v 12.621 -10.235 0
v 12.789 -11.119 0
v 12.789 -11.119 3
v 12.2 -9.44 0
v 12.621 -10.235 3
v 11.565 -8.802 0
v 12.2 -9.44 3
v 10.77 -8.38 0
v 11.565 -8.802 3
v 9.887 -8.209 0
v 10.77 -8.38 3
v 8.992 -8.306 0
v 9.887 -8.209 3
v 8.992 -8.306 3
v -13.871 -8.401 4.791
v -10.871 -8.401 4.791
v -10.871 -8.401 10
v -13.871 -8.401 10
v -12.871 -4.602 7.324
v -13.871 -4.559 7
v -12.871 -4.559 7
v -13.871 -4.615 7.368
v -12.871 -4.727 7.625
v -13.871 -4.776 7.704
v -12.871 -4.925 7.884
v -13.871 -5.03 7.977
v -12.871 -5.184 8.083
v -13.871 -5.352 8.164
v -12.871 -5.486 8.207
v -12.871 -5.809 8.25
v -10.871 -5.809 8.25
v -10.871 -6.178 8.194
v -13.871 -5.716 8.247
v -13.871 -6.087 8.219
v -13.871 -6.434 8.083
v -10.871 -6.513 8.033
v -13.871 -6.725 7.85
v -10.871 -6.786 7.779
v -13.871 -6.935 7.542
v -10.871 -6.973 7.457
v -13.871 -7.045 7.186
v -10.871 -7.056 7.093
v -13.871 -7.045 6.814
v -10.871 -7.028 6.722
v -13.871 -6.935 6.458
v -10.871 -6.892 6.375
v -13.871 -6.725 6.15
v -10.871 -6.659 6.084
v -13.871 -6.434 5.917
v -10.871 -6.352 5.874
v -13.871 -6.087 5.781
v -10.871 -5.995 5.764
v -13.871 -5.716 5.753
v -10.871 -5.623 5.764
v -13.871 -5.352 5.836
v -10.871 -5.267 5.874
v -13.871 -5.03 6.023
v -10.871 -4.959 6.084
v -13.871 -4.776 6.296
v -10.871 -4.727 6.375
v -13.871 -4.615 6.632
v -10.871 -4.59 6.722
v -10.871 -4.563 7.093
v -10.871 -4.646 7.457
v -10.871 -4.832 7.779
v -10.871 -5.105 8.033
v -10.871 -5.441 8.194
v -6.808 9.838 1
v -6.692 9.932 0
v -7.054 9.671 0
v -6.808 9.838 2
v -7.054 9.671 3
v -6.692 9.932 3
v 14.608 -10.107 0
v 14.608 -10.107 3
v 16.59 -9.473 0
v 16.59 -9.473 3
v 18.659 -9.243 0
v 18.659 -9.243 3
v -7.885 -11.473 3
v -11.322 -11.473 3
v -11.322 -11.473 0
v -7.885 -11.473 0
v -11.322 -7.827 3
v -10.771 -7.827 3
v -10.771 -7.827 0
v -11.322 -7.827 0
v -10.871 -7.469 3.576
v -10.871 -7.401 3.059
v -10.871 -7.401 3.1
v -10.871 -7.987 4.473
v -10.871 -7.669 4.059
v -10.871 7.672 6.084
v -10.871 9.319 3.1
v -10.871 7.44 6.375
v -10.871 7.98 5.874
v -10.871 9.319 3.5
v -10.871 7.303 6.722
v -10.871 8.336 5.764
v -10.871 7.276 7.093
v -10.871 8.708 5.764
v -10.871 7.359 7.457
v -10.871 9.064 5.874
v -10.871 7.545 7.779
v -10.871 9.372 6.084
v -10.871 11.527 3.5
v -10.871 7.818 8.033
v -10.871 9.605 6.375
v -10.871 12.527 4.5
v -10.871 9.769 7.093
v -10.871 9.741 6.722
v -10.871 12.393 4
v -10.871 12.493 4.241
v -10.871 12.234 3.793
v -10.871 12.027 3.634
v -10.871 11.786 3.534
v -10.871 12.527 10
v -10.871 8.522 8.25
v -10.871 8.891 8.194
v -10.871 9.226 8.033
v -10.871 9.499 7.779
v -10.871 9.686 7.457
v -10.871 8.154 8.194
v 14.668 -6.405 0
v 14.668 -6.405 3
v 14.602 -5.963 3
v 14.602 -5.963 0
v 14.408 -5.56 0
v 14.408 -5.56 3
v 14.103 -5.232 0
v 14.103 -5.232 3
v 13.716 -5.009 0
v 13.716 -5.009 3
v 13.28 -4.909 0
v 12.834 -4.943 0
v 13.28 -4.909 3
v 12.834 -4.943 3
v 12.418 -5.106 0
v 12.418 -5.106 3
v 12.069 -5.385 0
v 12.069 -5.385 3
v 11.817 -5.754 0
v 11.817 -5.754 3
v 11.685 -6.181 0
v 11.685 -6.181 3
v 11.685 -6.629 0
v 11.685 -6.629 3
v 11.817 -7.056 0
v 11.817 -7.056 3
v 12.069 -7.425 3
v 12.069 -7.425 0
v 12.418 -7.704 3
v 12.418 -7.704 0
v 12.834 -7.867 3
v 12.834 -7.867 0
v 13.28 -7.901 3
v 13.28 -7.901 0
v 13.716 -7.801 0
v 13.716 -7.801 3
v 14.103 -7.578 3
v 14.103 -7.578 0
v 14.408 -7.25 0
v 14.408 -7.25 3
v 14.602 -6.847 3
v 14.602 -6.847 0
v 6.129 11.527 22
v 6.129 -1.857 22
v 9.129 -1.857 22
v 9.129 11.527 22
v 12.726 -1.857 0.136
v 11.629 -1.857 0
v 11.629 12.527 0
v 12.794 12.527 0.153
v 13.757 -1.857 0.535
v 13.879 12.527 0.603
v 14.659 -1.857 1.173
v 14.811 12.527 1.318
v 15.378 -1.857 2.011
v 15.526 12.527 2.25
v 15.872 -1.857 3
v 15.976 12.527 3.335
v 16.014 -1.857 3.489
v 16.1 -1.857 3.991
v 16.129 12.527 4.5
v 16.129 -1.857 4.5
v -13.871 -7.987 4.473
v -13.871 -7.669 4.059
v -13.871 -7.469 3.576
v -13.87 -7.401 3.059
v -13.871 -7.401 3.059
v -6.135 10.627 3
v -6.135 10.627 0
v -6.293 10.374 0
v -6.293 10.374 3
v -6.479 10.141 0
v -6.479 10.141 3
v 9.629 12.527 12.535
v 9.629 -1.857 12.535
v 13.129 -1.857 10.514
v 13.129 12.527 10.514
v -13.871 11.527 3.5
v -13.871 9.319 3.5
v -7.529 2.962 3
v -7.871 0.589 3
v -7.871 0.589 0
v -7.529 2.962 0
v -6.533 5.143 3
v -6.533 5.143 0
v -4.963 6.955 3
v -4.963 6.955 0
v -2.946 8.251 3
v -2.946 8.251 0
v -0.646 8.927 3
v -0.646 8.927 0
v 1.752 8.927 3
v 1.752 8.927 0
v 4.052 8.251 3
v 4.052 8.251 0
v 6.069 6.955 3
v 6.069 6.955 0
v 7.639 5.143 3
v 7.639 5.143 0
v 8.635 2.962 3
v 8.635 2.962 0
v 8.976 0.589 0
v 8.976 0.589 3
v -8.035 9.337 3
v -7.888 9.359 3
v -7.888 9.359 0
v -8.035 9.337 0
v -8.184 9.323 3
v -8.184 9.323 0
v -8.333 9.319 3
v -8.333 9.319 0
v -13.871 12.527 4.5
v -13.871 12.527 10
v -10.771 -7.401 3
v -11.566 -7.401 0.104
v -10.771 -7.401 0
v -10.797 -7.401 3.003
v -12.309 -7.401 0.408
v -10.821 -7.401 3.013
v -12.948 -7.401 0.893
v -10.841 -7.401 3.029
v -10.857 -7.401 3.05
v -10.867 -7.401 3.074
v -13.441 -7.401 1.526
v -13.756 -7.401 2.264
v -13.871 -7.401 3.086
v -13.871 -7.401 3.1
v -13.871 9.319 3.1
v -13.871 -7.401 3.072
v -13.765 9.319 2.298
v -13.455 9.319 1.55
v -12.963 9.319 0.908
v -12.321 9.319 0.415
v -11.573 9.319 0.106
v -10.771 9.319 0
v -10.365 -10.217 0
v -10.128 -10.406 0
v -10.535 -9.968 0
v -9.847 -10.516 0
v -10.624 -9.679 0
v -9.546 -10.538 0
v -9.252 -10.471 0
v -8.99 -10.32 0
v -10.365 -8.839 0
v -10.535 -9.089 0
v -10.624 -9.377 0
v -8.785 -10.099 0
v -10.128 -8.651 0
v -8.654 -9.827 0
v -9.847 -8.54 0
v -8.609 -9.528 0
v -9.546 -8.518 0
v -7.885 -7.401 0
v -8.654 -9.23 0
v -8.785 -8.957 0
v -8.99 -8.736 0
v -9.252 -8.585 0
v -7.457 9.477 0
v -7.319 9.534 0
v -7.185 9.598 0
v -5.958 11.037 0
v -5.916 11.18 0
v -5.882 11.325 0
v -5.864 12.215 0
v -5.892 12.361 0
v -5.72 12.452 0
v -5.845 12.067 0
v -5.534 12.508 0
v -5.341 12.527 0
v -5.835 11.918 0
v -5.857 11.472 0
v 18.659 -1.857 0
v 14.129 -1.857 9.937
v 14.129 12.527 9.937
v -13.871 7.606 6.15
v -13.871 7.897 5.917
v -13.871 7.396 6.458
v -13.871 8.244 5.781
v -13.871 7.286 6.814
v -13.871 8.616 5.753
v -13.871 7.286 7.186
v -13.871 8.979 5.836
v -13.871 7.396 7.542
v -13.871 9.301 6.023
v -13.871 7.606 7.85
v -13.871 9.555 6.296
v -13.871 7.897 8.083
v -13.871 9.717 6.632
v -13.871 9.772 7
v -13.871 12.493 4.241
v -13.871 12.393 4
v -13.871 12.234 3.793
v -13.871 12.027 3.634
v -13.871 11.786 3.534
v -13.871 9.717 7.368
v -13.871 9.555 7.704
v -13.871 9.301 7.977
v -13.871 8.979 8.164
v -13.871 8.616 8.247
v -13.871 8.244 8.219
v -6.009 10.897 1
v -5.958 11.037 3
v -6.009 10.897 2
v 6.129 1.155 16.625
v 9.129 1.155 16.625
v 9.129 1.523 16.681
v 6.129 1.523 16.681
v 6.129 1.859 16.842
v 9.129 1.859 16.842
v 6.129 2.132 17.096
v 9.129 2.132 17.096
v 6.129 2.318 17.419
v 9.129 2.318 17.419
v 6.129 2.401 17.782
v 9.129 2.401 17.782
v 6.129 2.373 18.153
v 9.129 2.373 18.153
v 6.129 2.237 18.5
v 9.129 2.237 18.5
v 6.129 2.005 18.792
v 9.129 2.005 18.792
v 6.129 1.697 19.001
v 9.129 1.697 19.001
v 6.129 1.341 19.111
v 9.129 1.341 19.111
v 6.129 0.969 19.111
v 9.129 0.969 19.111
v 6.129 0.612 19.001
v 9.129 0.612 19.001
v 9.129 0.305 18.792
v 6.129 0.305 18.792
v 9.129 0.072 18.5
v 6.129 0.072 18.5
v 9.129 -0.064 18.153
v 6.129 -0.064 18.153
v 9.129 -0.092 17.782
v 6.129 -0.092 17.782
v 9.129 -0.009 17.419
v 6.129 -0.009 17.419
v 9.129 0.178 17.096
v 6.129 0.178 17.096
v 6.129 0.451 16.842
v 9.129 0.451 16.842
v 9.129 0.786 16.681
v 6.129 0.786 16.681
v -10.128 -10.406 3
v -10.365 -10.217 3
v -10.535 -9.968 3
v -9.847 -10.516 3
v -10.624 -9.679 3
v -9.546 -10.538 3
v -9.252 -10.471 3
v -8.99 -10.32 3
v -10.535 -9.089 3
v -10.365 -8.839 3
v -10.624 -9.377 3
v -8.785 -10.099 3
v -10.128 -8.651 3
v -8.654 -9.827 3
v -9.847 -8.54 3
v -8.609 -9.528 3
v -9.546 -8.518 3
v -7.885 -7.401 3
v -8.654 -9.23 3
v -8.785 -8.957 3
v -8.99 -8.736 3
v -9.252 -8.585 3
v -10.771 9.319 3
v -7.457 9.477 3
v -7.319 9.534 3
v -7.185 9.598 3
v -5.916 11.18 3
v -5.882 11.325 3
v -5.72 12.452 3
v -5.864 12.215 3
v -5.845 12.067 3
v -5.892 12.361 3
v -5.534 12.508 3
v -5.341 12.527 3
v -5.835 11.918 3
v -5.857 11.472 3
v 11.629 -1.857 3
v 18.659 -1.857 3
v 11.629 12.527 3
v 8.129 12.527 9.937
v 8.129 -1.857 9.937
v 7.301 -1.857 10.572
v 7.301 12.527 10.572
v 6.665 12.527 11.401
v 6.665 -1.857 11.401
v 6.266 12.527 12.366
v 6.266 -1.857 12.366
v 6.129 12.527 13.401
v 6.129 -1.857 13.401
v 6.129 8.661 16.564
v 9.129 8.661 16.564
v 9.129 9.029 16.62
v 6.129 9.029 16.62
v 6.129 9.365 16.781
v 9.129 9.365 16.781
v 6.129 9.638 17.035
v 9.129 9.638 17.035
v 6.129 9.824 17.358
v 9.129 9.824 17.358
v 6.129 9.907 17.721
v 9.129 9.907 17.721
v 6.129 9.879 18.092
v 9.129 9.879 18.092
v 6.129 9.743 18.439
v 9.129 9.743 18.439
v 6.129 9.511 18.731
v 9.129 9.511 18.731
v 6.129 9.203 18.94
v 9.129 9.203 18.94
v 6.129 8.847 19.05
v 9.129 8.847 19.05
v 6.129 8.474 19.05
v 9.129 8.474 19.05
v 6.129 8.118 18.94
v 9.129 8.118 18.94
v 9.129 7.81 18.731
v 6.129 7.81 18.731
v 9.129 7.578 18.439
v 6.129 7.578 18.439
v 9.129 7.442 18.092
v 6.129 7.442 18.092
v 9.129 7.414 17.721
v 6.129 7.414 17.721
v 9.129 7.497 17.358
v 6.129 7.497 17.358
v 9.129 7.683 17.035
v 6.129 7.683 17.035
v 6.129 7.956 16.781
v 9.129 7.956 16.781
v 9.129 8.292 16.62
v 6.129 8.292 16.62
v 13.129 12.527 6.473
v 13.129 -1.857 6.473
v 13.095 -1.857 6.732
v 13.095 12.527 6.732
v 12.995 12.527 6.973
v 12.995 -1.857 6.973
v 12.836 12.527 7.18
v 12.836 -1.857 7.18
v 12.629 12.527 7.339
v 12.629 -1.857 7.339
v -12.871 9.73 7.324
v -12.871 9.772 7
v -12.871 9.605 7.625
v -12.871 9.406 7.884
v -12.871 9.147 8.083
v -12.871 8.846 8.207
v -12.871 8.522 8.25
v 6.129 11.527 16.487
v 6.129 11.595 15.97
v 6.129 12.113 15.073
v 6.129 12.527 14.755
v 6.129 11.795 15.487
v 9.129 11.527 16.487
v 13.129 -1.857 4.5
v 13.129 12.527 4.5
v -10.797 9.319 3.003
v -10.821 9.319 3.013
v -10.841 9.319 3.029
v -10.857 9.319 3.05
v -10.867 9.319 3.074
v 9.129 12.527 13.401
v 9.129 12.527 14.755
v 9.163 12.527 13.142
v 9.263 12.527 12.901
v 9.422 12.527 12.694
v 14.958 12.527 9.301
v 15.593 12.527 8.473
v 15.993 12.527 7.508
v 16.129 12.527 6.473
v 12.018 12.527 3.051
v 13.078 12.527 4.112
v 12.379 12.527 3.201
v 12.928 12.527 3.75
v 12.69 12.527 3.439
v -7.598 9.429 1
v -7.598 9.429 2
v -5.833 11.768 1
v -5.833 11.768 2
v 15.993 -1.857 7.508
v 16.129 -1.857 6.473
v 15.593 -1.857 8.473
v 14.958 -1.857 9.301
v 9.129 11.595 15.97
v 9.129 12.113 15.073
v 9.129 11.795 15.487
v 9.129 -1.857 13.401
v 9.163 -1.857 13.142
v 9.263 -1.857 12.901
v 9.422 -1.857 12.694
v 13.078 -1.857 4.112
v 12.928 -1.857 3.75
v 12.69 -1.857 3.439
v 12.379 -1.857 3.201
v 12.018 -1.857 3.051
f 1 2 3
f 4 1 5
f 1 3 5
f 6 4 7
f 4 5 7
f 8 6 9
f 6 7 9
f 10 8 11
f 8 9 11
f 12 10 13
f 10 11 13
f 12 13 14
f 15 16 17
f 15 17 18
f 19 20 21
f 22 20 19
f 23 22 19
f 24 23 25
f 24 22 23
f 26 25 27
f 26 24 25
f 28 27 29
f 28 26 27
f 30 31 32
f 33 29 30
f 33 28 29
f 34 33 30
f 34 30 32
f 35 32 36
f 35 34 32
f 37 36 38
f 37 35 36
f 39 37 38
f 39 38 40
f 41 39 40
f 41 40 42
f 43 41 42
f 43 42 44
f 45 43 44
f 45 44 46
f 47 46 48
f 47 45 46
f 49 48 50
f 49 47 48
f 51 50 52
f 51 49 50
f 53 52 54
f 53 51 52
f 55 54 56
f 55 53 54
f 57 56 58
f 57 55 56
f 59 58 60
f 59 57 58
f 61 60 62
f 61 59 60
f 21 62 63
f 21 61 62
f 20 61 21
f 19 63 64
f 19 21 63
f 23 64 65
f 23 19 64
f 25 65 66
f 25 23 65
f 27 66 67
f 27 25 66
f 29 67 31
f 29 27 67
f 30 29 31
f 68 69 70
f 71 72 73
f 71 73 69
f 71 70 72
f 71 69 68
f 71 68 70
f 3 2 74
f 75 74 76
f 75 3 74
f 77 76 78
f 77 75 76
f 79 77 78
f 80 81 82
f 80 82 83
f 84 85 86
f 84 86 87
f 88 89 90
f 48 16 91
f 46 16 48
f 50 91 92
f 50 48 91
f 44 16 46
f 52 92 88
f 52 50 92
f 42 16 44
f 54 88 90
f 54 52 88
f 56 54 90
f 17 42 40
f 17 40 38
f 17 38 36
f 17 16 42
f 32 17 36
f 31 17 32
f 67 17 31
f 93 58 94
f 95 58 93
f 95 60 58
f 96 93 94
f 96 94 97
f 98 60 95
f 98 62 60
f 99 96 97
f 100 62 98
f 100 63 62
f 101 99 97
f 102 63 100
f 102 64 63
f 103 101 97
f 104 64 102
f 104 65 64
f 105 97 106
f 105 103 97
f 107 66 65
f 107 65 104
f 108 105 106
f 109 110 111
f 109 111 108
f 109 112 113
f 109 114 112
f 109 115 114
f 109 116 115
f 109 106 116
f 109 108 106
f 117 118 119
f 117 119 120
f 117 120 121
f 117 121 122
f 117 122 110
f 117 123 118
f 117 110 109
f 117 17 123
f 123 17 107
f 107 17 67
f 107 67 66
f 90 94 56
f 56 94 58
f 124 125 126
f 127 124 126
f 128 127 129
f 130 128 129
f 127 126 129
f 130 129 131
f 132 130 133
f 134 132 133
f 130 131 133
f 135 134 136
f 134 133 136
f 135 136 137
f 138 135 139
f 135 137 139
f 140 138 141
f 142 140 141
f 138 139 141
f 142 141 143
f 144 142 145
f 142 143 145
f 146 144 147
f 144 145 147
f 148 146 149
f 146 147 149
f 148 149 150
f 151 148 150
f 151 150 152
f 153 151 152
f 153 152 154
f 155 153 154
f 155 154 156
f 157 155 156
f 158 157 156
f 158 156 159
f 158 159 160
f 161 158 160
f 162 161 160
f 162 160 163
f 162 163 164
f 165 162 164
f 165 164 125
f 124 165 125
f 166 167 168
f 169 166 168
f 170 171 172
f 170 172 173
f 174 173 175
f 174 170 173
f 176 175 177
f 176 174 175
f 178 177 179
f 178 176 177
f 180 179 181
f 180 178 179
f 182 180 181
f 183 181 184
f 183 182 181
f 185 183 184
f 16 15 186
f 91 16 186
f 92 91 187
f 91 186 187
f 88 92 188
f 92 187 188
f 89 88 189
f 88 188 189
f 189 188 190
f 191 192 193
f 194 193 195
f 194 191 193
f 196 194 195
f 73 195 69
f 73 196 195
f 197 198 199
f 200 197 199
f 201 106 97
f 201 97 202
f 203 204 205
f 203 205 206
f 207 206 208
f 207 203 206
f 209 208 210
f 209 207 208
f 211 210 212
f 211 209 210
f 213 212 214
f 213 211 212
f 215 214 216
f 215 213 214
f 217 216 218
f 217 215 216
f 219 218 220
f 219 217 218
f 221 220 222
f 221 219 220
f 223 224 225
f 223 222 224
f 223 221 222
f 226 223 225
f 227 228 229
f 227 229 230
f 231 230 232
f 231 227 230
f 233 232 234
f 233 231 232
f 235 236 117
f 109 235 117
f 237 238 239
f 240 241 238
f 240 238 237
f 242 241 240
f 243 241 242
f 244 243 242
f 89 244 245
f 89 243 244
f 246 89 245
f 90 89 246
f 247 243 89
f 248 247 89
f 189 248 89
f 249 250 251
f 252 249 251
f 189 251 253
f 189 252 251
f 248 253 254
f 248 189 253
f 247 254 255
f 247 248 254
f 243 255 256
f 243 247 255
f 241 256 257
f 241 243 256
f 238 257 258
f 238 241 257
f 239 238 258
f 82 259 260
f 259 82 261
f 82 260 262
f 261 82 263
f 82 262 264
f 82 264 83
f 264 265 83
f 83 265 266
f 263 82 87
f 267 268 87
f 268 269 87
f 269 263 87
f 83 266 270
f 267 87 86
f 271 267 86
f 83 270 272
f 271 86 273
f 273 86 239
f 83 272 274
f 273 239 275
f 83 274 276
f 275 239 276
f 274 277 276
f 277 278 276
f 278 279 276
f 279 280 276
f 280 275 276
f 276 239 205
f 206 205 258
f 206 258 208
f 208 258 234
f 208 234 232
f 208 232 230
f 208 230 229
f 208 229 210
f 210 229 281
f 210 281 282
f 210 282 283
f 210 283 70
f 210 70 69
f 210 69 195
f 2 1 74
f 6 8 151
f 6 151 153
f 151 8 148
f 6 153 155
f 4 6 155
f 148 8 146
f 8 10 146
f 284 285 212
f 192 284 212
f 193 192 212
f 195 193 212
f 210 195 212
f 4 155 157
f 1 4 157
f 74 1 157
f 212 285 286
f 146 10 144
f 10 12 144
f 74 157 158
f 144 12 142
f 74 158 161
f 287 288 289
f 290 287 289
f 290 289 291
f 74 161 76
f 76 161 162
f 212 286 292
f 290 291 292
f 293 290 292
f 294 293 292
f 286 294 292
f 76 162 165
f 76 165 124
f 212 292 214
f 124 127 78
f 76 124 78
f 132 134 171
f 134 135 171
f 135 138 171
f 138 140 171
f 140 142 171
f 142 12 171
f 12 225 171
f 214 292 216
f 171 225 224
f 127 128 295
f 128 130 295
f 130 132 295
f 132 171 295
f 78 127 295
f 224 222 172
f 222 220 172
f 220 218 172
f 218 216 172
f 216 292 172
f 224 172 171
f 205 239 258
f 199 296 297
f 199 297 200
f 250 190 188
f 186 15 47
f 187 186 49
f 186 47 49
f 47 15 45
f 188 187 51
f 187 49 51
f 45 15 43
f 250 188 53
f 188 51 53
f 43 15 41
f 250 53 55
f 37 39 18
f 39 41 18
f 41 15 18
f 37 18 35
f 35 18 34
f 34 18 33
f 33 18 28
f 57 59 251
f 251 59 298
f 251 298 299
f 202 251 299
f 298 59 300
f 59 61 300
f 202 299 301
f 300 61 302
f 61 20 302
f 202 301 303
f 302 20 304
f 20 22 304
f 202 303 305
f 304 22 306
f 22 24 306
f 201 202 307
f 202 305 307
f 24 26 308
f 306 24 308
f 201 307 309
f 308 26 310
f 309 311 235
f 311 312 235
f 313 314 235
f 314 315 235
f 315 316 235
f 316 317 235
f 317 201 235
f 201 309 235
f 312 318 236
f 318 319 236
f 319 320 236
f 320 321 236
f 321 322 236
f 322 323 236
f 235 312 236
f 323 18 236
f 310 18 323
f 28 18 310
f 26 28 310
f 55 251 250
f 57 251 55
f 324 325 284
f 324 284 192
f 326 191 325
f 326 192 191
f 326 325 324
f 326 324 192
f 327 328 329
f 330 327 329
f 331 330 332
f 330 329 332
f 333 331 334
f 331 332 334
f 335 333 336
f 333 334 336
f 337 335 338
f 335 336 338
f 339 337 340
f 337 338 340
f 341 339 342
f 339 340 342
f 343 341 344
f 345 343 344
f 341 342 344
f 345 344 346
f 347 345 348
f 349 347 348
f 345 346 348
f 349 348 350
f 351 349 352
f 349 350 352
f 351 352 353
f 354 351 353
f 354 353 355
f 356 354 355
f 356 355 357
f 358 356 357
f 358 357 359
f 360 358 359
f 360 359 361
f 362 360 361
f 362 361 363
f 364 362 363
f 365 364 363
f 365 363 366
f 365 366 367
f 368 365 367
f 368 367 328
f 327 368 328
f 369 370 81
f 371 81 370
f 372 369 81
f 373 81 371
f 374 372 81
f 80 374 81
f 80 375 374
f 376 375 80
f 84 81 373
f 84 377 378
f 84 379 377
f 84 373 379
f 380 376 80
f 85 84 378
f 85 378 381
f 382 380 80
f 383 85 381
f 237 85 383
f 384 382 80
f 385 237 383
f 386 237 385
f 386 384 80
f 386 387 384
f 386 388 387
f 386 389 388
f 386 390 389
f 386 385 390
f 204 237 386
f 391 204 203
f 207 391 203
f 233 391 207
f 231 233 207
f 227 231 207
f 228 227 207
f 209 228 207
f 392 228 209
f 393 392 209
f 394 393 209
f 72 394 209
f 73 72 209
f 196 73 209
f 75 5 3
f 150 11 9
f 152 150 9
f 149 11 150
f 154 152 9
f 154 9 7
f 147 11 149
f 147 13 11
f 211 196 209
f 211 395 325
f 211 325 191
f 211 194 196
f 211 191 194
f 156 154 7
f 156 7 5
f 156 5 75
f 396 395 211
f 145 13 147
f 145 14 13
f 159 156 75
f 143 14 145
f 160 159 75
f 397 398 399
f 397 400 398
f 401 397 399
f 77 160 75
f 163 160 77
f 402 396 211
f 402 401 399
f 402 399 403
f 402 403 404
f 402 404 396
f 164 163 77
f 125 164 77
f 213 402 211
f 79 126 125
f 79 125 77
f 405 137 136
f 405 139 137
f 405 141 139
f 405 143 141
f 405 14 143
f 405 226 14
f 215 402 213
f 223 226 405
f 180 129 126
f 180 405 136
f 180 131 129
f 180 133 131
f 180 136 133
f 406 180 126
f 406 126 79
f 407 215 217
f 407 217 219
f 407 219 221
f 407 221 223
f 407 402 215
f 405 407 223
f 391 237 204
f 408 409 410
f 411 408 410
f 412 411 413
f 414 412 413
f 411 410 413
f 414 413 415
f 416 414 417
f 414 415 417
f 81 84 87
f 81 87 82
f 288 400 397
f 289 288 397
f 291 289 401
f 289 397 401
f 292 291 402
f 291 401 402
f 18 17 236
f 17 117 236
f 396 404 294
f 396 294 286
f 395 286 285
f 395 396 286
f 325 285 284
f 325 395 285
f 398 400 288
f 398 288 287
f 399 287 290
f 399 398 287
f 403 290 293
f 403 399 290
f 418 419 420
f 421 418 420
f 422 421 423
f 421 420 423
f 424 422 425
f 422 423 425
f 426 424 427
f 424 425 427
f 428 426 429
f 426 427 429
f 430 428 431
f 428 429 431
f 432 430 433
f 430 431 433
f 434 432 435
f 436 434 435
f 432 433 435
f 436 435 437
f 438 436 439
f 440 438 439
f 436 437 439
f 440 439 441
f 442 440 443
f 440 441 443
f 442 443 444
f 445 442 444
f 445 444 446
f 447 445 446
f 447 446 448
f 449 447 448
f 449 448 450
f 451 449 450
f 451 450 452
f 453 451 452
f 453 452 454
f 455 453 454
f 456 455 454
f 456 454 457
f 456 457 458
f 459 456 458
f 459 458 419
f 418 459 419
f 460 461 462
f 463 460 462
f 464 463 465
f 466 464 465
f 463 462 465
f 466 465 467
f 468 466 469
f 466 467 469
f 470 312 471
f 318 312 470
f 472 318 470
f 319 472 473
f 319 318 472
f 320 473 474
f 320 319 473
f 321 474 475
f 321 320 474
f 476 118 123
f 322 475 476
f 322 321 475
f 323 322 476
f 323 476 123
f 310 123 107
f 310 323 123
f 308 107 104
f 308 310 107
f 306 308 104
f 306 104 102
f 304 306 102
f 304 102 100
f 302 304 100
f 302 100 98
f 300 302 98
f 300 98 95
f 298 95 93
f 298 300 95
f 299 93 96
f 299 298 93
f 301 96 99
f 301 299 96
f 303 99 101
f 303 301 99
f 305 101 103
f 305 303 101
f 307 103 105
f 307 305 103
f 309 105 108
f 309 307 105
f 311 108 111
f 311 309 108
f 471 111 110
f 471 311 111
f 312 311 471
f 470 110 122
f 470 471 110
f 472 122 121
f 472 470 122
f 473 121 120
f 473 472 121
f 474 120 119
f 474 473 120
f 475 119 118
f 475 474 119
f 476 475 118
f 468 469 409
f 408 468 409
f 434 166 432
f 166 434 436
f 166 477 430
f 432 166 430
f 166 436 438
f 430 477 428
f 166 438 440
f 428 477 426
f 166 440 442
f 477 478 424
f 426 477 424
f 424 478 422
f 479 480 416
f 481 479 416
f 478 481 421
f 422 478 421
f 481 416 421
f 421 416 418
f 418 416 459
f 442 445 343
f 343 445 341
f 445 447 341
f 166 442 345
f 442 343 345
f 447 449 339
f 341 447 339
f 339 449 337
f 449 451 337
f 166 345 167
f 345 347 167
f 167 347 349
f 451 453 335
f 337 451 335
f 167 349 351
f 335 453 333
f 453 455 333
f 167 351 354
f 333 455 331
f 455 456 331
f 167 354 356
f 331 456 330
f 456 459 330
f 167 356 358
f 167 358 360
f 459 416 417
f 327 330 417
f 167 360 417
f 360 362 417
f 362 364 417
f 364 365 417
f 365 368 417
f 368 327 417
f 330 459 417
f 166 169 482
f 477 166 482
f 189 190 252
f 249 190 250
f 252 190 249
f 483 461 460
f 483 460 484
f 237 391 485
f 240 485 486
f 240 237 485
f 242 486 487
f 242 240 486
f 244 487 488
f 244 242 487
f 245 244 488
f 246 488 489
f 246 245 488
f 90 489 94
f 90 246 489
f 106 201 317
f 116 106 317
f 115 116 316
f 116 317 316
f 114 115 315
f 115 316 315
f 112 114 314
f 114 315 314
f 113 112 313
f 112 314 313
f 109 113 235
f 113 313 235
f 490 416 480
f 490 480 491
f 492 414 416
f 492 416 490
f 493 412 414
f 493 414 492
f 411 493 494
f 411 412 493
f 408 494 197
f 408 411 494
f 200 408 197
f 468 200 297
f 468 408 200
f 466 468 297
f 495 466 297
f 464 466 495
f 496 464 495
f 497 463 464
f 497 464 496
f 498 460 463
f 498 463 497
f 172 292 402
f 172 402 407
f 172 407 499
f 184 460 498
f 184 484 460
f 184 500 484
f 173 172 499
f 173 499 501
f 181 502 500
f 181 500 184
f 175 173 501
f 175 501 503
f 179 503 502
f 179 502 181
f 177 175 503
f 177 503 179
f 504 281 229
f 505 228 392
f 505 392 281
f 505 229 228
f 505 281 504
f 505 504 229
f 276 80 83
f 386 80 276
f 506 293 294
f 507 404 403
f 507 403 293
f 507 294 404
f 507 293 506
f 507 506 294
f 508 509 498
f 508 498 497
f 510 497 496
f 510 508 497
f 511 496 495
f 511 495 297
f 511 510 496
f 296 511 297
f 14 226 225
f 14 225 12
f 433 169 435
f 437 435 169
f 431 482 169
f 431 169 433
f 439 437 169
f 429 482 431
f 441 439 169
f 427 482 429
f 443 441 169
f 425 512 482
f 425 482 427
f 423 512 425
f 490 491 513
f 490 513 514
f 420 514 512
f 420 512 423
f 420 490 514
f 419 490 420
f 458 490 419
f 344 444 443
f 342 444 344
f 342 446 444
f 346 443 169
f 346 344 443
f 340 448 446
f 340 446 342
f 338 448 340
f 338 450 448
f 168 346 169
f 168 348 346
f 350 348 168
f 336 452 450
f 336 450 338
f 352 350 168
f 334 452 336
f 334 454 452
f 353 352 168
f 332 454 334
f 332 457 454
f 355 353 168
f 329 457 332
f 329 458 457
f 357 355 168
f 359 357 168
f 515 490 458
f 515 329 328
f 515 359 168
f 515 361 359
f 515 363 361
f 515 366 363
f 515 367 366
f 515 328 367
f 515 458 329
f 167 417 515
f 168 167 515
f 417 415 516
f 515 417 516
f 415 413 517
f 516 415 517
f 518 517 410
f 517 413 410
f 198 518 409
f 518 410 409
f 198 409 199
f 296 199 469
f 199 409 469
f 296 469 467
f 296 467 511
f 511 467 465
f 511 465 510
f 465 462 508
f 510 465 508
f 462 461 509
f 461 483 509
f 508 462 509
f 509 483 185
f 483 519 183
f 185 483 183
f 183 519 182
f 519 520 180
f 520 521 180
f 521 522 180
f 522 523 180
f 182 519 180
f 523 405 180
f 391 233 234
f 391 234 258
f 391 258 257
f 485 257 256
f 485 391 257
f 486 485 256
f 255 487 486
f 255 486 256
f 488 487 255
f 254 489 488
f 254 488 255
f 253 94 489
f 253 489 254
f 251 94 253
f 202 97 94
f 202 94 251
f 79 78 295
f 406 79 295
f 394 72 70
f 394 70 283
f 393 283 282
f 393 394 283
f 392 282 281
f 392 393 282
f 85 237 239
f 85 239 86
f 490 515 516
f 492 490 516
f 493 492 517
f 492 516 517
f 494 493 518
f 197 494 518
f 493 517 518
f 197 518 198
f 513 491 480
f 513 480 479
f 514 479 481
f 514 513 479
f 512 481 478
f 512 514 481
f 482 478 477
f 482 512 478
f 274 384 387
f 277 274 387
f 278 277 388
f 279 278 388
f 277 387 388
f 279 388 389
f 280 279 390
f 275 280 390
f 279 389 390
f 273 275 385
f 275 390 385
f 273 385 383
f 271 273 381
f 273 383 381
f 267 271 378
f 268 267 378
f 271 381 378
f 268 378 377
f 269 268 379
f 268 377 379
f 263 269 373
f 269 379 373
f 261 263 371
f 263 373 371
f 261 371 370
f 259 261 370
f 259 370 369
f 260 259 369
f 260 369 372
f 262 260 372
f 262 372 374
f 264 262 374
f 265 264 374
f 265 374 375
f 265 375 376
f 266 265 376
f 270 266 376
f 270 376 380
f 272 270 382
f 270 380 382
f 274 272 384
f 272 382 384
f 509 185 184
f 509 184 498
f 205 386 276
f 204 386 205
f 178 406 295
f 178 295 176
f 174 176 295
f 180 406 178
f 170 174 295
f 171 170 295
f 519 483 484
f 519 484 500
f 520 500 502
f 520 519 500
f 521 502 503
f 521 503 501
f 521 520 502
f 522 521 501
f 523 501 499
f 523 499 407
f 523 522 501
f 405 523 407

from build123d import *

# Parameters (mm, degrees)
SKETCH1_W                    = 30.529513274
SKETCH1_H                    = 24
BOSS_EXTRUDE1_DEPTH          = 3
SKETCH2_R                    = 1.5
CUT_EXTRUDE1_DEPTH           = 10
SKETCH6_R                    = 3.031001388
SKETCH6_R_2                  = 1.013144299
CUT_EXTRUDE3_DEPTH           = 10
SKETCH4_W                    = 2
SKETCH4_H                    = 19.928154349
BOSS_EXTRUDE2_DEPTH          = 10
SKETCH5_R                    = 1.25
CUT_EXTRUDE2_DEPTH           = 36.369951754
SKETCH31_W                   = 7.266440603
SKETCH31_H                   = 7.840373691
CUT_EXTRUDE6_DEPTH           = 10
CONVERT_SOLID1_START         = -13.578124278
CONVERT_SOLID1_OUTLINE_W     = 19.928154349
CONVERT_SOLID1_OUTLINE_H     = 7
CONVERT_SOLID1_OUTLINE_R     = 1.25
CONVERT_SOLID1_DEPTH         = 0.707422
CONVERT_SOLID1_START_2       = -13.870702278
CONVERT_SOLID1_2_OUTLINE_W   = 19.928154349
CONVERT_SOLID1_2_OUTLINE_H   = 10
CONVERT_SOLID1_2_OUTLINE_R   = 1.25
CONVERT_SOLID1_2_DEPTH       = 1
CONVERT_SOLID1_START_3       = -12.304269382
CONVERT_SOLID1_3_OUTLINE_W   = 19.928154349
CONVERT_SOLID1_3_OUTLINE_H   = 7
CONVERT_SOLID1_3_OUTLINE_R   = 1.25
CONVERT_SOLID1_3_DEPTH       = 1.533567104
CONVERT_SOLID1_START_4       = -7.401252108
CONVERT_SOLID1_4_DEPTH       = 19.928154349
SKETCH24_W                   = 5.529513274
SKETCH24_H                   = 14.38372484
CUT_EXTRUDE4_DEPTH           = 10
EDGE_FLANGE4_STRIP_W         = 15
EDGE_FLANGE4_STRIP_H         = 3
EDGE_FLANGE4_STRIP_CUT_DEPTH = 14.38372484
EDGE_FLANGE4_DEPTH           = 14.38372484
JOG1_START                   = -1.856822599
JOG1_DEPTH                   = 14.38372484
JOG1_2_DEPTH                 = 14.38372484
SKETCH30_R                   = 1.25
CUT_EXTRUDE5_DEPTH           = 10
SKETCH32_R                   = 1.013144299
BOSS_EXTRUDE3_DEPTH          = 3
SKETCH33_W                   = 7.665012493
SKETCH33_H                   = 1
CUT_EXTRUDE7_DEPTH           = 10
FILLET1_R                    = 2
SKETCH34_W                   = 3
SKETCH34_H                   = 5.209304408
BOSS_EXTRUDE4_DEPTH          = 1
FILLET2_START                = -13.870702278
FILLET2_DEPTH                = 3
CUT_EXTRUDE8_START           = -3.5
CUT_EXTRUDE8_DEPTH           = 3.5
FILLET3_R                    = 1


with BuildPart() as part:
    # Sketch1 → Boss-Extrude1 (new body)
    with BuildSketch(Plane.XY):
        with Locations((3.394054359, 0.526902241)):
            Rectangle(SKETCH1_W, SKETCH1_H)
    extrude(amount=BOSS_EXTRUDE1_DEPTH)

    # Sketch2 → Cut-Extrude1 (cut)
    with BuildSketch(Plane.XY.offset(3)):
        with Locations((13.168159701, -6.404941255)):
            Circle(SKETCH2_R)
        with BuildLine():
            Line((8.976475461, 0.589001072), (9.005600067, -15.908139628))
            ThreePointArc((9.005600067, -15.908139628), (29.280658421, -19.723388497), (9.019197546, -23.610201897))
            Line((9.019197546, -23.610201897), (9.019729255, -23.911379441))
            ThreePointArc((9.019729255, -23.911379441), (0.556548127, -32.385304577), (-7.913797188, -23.918540598))
            Line((-7.913797188, -23.918540598), (-7.870540366, 0.589001072))
            ThreePointArc((-7.870540366, 0.589001072), (0.552967548, 9.012508985), (8.976475461, 0.589001072))
        make_face()
    extrude(amount=-CUT_EXTRUDE1_DEPTH, mode=Mode.SUBTRACT)

    # Sketch6 → Cut-Extrude3 (cut)
    with BuildSketch(Plane.XY.offset(3)):
        with Locations((9.76051578, -11.237842953)):
            Circle(SKETCH6_R)
        with Locations((-9.621874041, -9.528153609)):
            Circle(SKETCH6_R_2)
    extrude(amount=-CUT_EXTRUDE3_DEPTH, mode=Mode.SUBTRACT)

    # Sketch4 → Boss-Extrude2 (add)
    with BuildSketch(Plane.XY):
        with Locations((-11.870702278, 2.562825066)):
            Rectangle(SKETCH4_W, SKETCH4_H)
    extrude(amount=BOSS_EXTRUDE2_DEPTH)

    # Sketch5 → Cut-Extrude2 (cut, through all)
    with BuildSketch(Plane(origin=(-12.870702278, 0, 0), x_dir=(0, 0, -1), z_dir=(1, 0, 0))):
        with Locations(Location((-7, 8.522127831, 0), (0, 0, 180))):
            Circle(SKETCH5_R)
        with Locations(Location((-7, -5.809148927, 0), (0, 0, 180))):
            Circle(SKETCH5_R)
    extrude(amount=CUT_EXTRUDE2_DEPTH, mode=Mode.SUBTRACT)

    # Sketch31 → Cut-Extrude6 (cut)
    with BuildSketch(Plane.XY.offset(3)):
        with Locations((-8.237481976, -11.321438954)):
            Rectangle(SKETCH31_W, SKETCH31_H)
    extrude(amount=-CUT_EXTRUDE6_DEPTH, mode=Mode.SUBTRACT)

    # Convert-Solid1: read off the stored shape, not the designer's step
    # Convert-Solid1 outline → Convert-Solid1 (add)
    with BuildSketch(Plane.YZ.offset(CONVERT_SOLID1_START)):
        with Locations((2.562825066, 6.5)):
            Rectangle(CONVERT_SOLID1_OUTLINE_W, CONVERT_SOLID1_OUTLINE_H)
        with Locations((-5.809148927, 7)):
            Circle(CONVERT_SOLID1_OUTLINE_R, mode=Mode.SUBTRACT)
        with Locations((8.522127831, 7)):
            Circle(CONVERT_SOLID1_OUTLINE_R, mode=Mode.SUBTRACT)
    extrude(amount=CONVERT_SOLID1_DEPTH)

    # Convert-Solid1 2 outline → Convert-Solid1 2 (add)
    with BuildSketch(Plane.YZ.offset(CONVERT_SOLID1_START_2)):
        with Locations((2.562825066, 5)):
            Rectangle(CONVERT_SOLID1_2_OUTLINE_W, CONVERT_SOLID1_2_OUTLINE_H)
        with Locations((8.522127831, 7)):
            Circle(CONVERT_SOLID1_2_OUTLINE_R, mode=Mode.SUBTRACT)
        with Locations((-5.809148927, 7)):
            Circle(CONVERT_SOLID1_2_OUTLINE_R, mode=Mode.SUBTRACT)
    extrude(amount=CONVERT_SOLID1_2_DEPTH)

    # Convert-Solid1 3 outline → Convert-Solid1 3 (add)
    with BuildSketch(Plane.YZ.offset(CONVERT_SOLID1_START_3)):
        with Locations((2.562825066, 6.5)):
            Rectangle(CONVERT_SOLID1_3_OUTLINE_W, CONVERT_SOLID1_3_OUTLINE_H)
        with Locations((-5.809148927, 7)):
            Circle(CONVERT_SOLID1_3_OUTLINE_R, mode=Mode.SUBTRACT)
        with Locations((8.522127831, 7)):
            Circle(CONVERT_SOLID1_3_OUTLINE_R, mode=Mode.SUBTRACT)
    extrude(amount=CONVERT_SOLID1_3_DEPTH)

    # Convert-Solid1 4 outline → Convert-Solid1 4 (cut)
    with BuildSketch(Plane(origin=(0, 0, 0), x_dir=(1, 0, 0), z_dir=(0, 1, 0)).offset(CONVERT_SOLID1_START_4)):
        with BuildLine():
            ThreePointArc((-10.770702278, -3), (-10.841412956, -3.029289322), (-10.870702278, -3.1))
            Line((-10.870702278, -3.1), (-10.870702278, -10))
            Line((-10.870702278, -10), (-10.770702278, -10))
            Line((-10.770702278, -10), (-10.770702278, -3))
        make_face()
        with BuildLine():
            Line((-13.870702278, 0), (-13.870702278, -3.1))
            ThreePointArc((-13.870702278, -3.1), (-12.9627333, -0.907968978), (-10.770702278, 0))
            Line((-10.770702278, 0), (-13.870702278, 0))
        make_face()
    extrude(amount=CONVERT_SOLID1_4_DEPTH, mode=Mode.SUBTRACT)

    # Sketch24 → Cut-Extrude4 (cut)
    with BuildSketch(Plane.XY.offset(3)):
        with Locations((15.894054359, 5.335039821)):
            Rectangle(SKETCH24_W, SKETCH24_H)
    extrude(amount=-CUT_EXTRUDE4_DEPTH, mode=Mode.SUBTRACT)

    # Edge-Flange4: sheet metal written as solids
    # Edge-Flange4 strip (on a plane across the edge) → Edge-Flange4 strip cut (cut)
    with BuildSketch(Plane(origin=(13.129297722, -1.856822599, 3), x_dir=(-1, 0, 0), z_dir=(0, 1, 0))):
        with Locations((-6, -1.5)):
            Rectangle(EDGE_FLANGE4_STRIP_W, EDGE_FLANGE4_STRIP_H)
    extrude(amount=EDGE_FLANGE4_STRIP_CUT_DEPTH, mode=Mode.SUBTRACT)

    # Edge-Flange4 section (on a plane across the edge) → Edge-Flange4 (add)
    with BuildSketch(Plane(origin=(13.129297722, -1.856822599, 3), x_dir=(-1, 0, 0), z_dir=(0, 1, 0))):
        with BuildLine():
            Line((-3, 1.5), (-3, 19))
            Line((-3, 19), (0, 19))
            Line((0, 19), (0, 1.5))
            ThreePointArc((0, 1.5), (0.439339828, 0.439339828), (1.5, 0))
            Line((1.5, 0), (1.5, -3))
            ThreePointArc((1.5, -3), (-1.681980515, -1.681980515), (-3, 1.5))
        make_face()
    extrude(amount=EDGE_FLANGE4_DEPTH)

    # Jog1: read off the stored shape, not the designer's step
    # Jog1 outline → Jog1 (cut)
    with BuildSketch(Plane(origin=(0, 0, 0), x_dir=(1, 0, 0), z_dir=(0, 1, 0)).offset(JOG1_START)):
        with BuildLine():
            Line((14.129297722, -9.936789869), (13.129297722, -10.514140138))
            Line((13.129297722, -10.514140138), (13.129297722, -22))
            Line((13.129297722, -22), (16.129297722, -22))
            Line((16.129297722, -22), (16.129297722, -6.472688254))
            ThreePointArc((16.129297722, -6.472688254), (15.593399337, -8.472688254), (14.129297722, -9.936789869))
        make_face()
    extrude(amount=JOG1_DEPTH, mode=Mode.SUBTRACT)

    # Jog1 2 outline → Jog1 2 (add)
    with BuildSketch(Plane(origin=(0, 0, 0), x_dir=(1, 0, 0), z_dir=(0, 1, 0)).offset(JOG1_START)):
        with BuildLine():
            ThreePointArc((13.129297722, -6.472688254), (12.995323126, -6.972688254), (12.629297722, -7.338713658))
            Line((12.629297722, -7.338713658), (8.129297722, -9.936789869))
            ThreePointArc((8.129297722, -9.936789869), (6.665196107, -11.400891484), (6.129297722, -13.400891484))
            Line((6.129297722, -13.400891484), (6.129297722, -22))
            Line((6.129297722, -22), (9.129297722, -22))
            Line((9.129297722, -22), (9.129297722, -13.400891484))
            ThreePointArc((9.129297722, -13.400891484), (9.263272318, -12.900891484), (9.629297722, -12.534866081))
            Line((9.629297722, -12.534866081), (13.129297722, -10.514140138))
            Line((13.129297722, -10.514140138), (13.129297722, -6.472688254))
        make_face()
    extrude(amount=JOG1_2_DEPTH)

    # Sketch30 → Cut-Extrude5 (cut)
    with BuildSketch(Plane(origin=(9.129297722, 0, 0), x_dir=(0, 0, -1), z_dir=(1, 0, 0))):
        with Locations((-17.875225206, 1.154804866)):
            Circle(SKETCH30_R)
        with Locations((-17.814240258, 8.660520186)):
            Circle(SKETCH30_R)
    extrude(amount=-CUT_EXTRUDE5_DEPTH, mode=Mode.SUBTRACT)

    # Sketch32 → Boss-Extrude3 (add)
    with BuildSketch(Plane.XY.offset(3)):
        Polygon((-7.884643492, -7.401252108), (-10.770702278, -7.401252108), (-10.770702278, -7.827453032), (-11.321822858, -7.827453032), (-11.321822858, -11.473097759), (-10.770702278, -11.473097759), (-7.884643492, -11.473097759), align=None)
        with Locations((-9.621874041, -9.528153609)):
            Circle(SKETCH32_R, mode=Mode.SUBTRACT)
    extrude(amount=-BOSS_EXTRUDE3_DEPTH)

    # Sketch33 → Cut-Extrude7 (cut)
    with BuildSketch(Plane(origin=(9.129297722, 0, 0), x_dir=(0, 0, -1), z_dir=(1, 0, 0))):
        with Locations((-18.587893568, 12.026902241)):
            Rectangle(SKETCH33_W, SKETCH33_H)
    extrude(amount=-CUT_EXTRUDE7_DEPTH, mode=Mode.SUBTRACT)

    # Fillet1
    # the kernel refuses this fillet: 2 mm, written as the material it adds along each edge
    with BuildSketch(Plane(origin=(9.129297722, 11.526902241, 14.755387321), x_dir=(0, 1, 0), z_dir=(-1, 0, 0))) as fillet1_piece_1:
        with BuildLine():
            CenterArc((2, -1.732050808), FILLET1_R, 120, 60)
            Line((0, -1.732050808), (-0.04, -1.732050808))
            Line((-0.04, -1.732050808), (-0.04, 0))
            Line((-0.04, 0), (0, 0.04))
            ThreePointArc((0, 0.04), (0.5, 0.04), (0.98, 0.034641016))
            Line((0.98, 0.034641016), (1, 0))
        make_face()
    extrude(amount=3)

    # Sketch34 → Boss-Extrude4 (add)
    with BuildSketch(Plane(origin=(0, -7.401252108, 0), x_dir=(-1, 0, 0), z_dir=(0, -1, 0))):
        with Locations((12.370702278, -7.395347796)):
            Rectangle(SKETCH34_W, SKETCH34_H)
    extrude(amount=BOSS_EXTRUDE4_DEPTH)

    # Fillet2: read off the stored shape, not the designer's step
    # Fillet2 outline → Fillet2 (add)
    with BuildSketch(Plane.YZ.offset(FILLET2_START)):
        with BuildLine():
            ThreePointArc((-8.401252108, 4.790695592), (-7.669201301, 4.058644784), (-7.401252108, 3.058644784))
            Line((-7.401252108, 3.058644784), (-7.401252108, 4.790695592))
            Line((-7.401252108, 4.790695592), (-8.401252108, 4.790695592))
        make_face()
    extrude(amount=FILLET2_DEPTH)

    # Cut-Extrude8: read off the stored shape, not the designer's step
    # Cut-Extrude8 outline → Cut-Extrude8 (cut)
    with BuildSketch(Plane(origin=(0, 0, 0), x_dir=(-1, 0, 0), z_dir=(0, 0, -1)).offset(CUT_EXTRUDE8_START)):
        with BuildLine():
            add(Edge.make_bspline(
                [(5.934293569, 12.526902242), (5.918772793, 12.474323244), (5.904747253, 12.419100587), (5.892251154, 12.361173794)],
                knots=[0.637263122, 0.637263122, 0.637263122, 0.637263122, 0.651841432, 0.651841432, 0.651841432, 0.651841432], degree=3))
            ThreePointArc((5.892251154, 12.361173794), (5.853557529, 12.140940274), (5.834697256, 11.918130287))
            add(Edge.make_bspline(
                [(5.834697256, 11.918130287), (5.828106476, 11.7671908), (5.836044906, 11.619075327), (5.856920418, 11.471917187)],
                knots=[0.686657289, 0.686657289, 0.686657289, 0.686657289, 0.721473146, 0.721473146, 0.721473146, 0.721473146], degree=3))
            ThreePointArc((5.856920418, 11.471917187), (5.897826068, 11.252083778), (5.958210921, 11.036784754))
            add(Edge.make_bspline(
                [(5.958210921, 11.036784754), (6.004813319, 10.89501127), (6.064205524, 10.757665111), (6.135333951, 10.626629378)],
                knots=[0.756289002, 0.756289002, 0.756289002, 0.756289002, 0.791104859, 0.791104859, 0.791104859, 0.791104859], degree=3))
            ThreePointArc((6.135333951, 10.626629378), (6.382632907, 10.254549782), (6.69221005, 9.9324287))
            add(Edge.make_bspline(
                [(6.69221005, 9.9324287), (6.804734203, 9.834537986), (6.9260354, 9.746668372), (7.054178725, 9.670553388)],
                knots=[0.860736573, 0.860736573, 0.860736573, 0.860736573, 0.89555243, 0.89555243, 0.89555243, 0.89555243], degree=3))
            ThreePointArc((7.054178725, 9.670553388), (7.251253019, 9.564904332), (7.4569791, 9.477287098))
            add(Edge.make_bspline(
                [(7.4569791, 9.477287098), (7.596650694, 9.424496148), (7.741008428, 9.383274602), (7.887747341, 9.358801983)],
                knots=[0.930368286, 0.930368286, 0.930368286, 0.930368286, 0.965184143, 0.965184143, 0.965184143, 0.965184143], degree=3))
            ThreePointArc((7.887747341, 9.358801983), (8.109343355, 9.328881983), (8.332726434, 9.318881983))
            Line((8.332726434, 9.318881983), (13.870702278, 9.318881983))
            Line((13.870702278, 9.318881983), (13.870702278, 12.526902241))
            Line((13.870702278, 12.526902241), (5.934293569, 12.526902242))
        make_face()
    extrude(amount=CUT_EXTRUDE8_DEPTH, mode=Mode.SUBTRACT)

    # Fillet3
    # the kernel refuses this fillet: 1 mm, written as the material it takes off along each edge
    with BuildSketch(Plane(origin=(-5.934293569, 12.526902242, 4.483490455), x_dir=(1.0, -1.2849512844453004e-09, 0), z_dir=(0, 0, -1))) as fillet3_piece_1:
        with BuildLine():
            CenterArc((0.593396183, 1), FILLET3_R, 236.540063236, 33.45993669)
            Line((0.042042415, 0.165728448), (0.03101534, 0.149043017))
            ThreePointArc((0.03101534, 0.149043017), (0.003175491, 0.087378927), (-0.019181734, 0.00566225))
            Line((-0.019181734, 0.00566225), (0, -0.02))
            Line((0, -0.02), (0.593396182, -0.02))
            Line((0.593396182, -0.02), (0.593396182, 0))
        make_face()
    extrude(amount=5.966980909, mode=Mode.SUBTRACT)
    with BuildSketch(Plane(origin=(-16.370702278, 12.526902241, 3.5), x_dir=(1.2600158578102924e-10, -1.0, 0), z_dir=(1.0, 1.2600158578102924e-10, 0))) as fillet3_piece_2:
        with BuildLine():
            CenterArc((FILLET3_R, -FILLET3_R), FILLET3_R, 90, 90)
            Line((0, -FILLET3_R), (-FILLET3_R * 0.0200000000485, -FILLET3_R))
            Line((-FILLET3_R * 0.0200000000485, -FILLET3_R), (-FILLET3_R * 0.02, FILLET3_R * 0.02))
            Line((-FILLET3_R * 0.02, FILLET3_R * 0.02), (FILLET3_R, FILLET3_R * 0.02))
            Line((FILLET3_R, FILLET3_R * 0.02), (FILLET3_R, 0))
        make_face()
    extrude(amount=8, mode=Mode.SUBTRACT)


solid = part.part
